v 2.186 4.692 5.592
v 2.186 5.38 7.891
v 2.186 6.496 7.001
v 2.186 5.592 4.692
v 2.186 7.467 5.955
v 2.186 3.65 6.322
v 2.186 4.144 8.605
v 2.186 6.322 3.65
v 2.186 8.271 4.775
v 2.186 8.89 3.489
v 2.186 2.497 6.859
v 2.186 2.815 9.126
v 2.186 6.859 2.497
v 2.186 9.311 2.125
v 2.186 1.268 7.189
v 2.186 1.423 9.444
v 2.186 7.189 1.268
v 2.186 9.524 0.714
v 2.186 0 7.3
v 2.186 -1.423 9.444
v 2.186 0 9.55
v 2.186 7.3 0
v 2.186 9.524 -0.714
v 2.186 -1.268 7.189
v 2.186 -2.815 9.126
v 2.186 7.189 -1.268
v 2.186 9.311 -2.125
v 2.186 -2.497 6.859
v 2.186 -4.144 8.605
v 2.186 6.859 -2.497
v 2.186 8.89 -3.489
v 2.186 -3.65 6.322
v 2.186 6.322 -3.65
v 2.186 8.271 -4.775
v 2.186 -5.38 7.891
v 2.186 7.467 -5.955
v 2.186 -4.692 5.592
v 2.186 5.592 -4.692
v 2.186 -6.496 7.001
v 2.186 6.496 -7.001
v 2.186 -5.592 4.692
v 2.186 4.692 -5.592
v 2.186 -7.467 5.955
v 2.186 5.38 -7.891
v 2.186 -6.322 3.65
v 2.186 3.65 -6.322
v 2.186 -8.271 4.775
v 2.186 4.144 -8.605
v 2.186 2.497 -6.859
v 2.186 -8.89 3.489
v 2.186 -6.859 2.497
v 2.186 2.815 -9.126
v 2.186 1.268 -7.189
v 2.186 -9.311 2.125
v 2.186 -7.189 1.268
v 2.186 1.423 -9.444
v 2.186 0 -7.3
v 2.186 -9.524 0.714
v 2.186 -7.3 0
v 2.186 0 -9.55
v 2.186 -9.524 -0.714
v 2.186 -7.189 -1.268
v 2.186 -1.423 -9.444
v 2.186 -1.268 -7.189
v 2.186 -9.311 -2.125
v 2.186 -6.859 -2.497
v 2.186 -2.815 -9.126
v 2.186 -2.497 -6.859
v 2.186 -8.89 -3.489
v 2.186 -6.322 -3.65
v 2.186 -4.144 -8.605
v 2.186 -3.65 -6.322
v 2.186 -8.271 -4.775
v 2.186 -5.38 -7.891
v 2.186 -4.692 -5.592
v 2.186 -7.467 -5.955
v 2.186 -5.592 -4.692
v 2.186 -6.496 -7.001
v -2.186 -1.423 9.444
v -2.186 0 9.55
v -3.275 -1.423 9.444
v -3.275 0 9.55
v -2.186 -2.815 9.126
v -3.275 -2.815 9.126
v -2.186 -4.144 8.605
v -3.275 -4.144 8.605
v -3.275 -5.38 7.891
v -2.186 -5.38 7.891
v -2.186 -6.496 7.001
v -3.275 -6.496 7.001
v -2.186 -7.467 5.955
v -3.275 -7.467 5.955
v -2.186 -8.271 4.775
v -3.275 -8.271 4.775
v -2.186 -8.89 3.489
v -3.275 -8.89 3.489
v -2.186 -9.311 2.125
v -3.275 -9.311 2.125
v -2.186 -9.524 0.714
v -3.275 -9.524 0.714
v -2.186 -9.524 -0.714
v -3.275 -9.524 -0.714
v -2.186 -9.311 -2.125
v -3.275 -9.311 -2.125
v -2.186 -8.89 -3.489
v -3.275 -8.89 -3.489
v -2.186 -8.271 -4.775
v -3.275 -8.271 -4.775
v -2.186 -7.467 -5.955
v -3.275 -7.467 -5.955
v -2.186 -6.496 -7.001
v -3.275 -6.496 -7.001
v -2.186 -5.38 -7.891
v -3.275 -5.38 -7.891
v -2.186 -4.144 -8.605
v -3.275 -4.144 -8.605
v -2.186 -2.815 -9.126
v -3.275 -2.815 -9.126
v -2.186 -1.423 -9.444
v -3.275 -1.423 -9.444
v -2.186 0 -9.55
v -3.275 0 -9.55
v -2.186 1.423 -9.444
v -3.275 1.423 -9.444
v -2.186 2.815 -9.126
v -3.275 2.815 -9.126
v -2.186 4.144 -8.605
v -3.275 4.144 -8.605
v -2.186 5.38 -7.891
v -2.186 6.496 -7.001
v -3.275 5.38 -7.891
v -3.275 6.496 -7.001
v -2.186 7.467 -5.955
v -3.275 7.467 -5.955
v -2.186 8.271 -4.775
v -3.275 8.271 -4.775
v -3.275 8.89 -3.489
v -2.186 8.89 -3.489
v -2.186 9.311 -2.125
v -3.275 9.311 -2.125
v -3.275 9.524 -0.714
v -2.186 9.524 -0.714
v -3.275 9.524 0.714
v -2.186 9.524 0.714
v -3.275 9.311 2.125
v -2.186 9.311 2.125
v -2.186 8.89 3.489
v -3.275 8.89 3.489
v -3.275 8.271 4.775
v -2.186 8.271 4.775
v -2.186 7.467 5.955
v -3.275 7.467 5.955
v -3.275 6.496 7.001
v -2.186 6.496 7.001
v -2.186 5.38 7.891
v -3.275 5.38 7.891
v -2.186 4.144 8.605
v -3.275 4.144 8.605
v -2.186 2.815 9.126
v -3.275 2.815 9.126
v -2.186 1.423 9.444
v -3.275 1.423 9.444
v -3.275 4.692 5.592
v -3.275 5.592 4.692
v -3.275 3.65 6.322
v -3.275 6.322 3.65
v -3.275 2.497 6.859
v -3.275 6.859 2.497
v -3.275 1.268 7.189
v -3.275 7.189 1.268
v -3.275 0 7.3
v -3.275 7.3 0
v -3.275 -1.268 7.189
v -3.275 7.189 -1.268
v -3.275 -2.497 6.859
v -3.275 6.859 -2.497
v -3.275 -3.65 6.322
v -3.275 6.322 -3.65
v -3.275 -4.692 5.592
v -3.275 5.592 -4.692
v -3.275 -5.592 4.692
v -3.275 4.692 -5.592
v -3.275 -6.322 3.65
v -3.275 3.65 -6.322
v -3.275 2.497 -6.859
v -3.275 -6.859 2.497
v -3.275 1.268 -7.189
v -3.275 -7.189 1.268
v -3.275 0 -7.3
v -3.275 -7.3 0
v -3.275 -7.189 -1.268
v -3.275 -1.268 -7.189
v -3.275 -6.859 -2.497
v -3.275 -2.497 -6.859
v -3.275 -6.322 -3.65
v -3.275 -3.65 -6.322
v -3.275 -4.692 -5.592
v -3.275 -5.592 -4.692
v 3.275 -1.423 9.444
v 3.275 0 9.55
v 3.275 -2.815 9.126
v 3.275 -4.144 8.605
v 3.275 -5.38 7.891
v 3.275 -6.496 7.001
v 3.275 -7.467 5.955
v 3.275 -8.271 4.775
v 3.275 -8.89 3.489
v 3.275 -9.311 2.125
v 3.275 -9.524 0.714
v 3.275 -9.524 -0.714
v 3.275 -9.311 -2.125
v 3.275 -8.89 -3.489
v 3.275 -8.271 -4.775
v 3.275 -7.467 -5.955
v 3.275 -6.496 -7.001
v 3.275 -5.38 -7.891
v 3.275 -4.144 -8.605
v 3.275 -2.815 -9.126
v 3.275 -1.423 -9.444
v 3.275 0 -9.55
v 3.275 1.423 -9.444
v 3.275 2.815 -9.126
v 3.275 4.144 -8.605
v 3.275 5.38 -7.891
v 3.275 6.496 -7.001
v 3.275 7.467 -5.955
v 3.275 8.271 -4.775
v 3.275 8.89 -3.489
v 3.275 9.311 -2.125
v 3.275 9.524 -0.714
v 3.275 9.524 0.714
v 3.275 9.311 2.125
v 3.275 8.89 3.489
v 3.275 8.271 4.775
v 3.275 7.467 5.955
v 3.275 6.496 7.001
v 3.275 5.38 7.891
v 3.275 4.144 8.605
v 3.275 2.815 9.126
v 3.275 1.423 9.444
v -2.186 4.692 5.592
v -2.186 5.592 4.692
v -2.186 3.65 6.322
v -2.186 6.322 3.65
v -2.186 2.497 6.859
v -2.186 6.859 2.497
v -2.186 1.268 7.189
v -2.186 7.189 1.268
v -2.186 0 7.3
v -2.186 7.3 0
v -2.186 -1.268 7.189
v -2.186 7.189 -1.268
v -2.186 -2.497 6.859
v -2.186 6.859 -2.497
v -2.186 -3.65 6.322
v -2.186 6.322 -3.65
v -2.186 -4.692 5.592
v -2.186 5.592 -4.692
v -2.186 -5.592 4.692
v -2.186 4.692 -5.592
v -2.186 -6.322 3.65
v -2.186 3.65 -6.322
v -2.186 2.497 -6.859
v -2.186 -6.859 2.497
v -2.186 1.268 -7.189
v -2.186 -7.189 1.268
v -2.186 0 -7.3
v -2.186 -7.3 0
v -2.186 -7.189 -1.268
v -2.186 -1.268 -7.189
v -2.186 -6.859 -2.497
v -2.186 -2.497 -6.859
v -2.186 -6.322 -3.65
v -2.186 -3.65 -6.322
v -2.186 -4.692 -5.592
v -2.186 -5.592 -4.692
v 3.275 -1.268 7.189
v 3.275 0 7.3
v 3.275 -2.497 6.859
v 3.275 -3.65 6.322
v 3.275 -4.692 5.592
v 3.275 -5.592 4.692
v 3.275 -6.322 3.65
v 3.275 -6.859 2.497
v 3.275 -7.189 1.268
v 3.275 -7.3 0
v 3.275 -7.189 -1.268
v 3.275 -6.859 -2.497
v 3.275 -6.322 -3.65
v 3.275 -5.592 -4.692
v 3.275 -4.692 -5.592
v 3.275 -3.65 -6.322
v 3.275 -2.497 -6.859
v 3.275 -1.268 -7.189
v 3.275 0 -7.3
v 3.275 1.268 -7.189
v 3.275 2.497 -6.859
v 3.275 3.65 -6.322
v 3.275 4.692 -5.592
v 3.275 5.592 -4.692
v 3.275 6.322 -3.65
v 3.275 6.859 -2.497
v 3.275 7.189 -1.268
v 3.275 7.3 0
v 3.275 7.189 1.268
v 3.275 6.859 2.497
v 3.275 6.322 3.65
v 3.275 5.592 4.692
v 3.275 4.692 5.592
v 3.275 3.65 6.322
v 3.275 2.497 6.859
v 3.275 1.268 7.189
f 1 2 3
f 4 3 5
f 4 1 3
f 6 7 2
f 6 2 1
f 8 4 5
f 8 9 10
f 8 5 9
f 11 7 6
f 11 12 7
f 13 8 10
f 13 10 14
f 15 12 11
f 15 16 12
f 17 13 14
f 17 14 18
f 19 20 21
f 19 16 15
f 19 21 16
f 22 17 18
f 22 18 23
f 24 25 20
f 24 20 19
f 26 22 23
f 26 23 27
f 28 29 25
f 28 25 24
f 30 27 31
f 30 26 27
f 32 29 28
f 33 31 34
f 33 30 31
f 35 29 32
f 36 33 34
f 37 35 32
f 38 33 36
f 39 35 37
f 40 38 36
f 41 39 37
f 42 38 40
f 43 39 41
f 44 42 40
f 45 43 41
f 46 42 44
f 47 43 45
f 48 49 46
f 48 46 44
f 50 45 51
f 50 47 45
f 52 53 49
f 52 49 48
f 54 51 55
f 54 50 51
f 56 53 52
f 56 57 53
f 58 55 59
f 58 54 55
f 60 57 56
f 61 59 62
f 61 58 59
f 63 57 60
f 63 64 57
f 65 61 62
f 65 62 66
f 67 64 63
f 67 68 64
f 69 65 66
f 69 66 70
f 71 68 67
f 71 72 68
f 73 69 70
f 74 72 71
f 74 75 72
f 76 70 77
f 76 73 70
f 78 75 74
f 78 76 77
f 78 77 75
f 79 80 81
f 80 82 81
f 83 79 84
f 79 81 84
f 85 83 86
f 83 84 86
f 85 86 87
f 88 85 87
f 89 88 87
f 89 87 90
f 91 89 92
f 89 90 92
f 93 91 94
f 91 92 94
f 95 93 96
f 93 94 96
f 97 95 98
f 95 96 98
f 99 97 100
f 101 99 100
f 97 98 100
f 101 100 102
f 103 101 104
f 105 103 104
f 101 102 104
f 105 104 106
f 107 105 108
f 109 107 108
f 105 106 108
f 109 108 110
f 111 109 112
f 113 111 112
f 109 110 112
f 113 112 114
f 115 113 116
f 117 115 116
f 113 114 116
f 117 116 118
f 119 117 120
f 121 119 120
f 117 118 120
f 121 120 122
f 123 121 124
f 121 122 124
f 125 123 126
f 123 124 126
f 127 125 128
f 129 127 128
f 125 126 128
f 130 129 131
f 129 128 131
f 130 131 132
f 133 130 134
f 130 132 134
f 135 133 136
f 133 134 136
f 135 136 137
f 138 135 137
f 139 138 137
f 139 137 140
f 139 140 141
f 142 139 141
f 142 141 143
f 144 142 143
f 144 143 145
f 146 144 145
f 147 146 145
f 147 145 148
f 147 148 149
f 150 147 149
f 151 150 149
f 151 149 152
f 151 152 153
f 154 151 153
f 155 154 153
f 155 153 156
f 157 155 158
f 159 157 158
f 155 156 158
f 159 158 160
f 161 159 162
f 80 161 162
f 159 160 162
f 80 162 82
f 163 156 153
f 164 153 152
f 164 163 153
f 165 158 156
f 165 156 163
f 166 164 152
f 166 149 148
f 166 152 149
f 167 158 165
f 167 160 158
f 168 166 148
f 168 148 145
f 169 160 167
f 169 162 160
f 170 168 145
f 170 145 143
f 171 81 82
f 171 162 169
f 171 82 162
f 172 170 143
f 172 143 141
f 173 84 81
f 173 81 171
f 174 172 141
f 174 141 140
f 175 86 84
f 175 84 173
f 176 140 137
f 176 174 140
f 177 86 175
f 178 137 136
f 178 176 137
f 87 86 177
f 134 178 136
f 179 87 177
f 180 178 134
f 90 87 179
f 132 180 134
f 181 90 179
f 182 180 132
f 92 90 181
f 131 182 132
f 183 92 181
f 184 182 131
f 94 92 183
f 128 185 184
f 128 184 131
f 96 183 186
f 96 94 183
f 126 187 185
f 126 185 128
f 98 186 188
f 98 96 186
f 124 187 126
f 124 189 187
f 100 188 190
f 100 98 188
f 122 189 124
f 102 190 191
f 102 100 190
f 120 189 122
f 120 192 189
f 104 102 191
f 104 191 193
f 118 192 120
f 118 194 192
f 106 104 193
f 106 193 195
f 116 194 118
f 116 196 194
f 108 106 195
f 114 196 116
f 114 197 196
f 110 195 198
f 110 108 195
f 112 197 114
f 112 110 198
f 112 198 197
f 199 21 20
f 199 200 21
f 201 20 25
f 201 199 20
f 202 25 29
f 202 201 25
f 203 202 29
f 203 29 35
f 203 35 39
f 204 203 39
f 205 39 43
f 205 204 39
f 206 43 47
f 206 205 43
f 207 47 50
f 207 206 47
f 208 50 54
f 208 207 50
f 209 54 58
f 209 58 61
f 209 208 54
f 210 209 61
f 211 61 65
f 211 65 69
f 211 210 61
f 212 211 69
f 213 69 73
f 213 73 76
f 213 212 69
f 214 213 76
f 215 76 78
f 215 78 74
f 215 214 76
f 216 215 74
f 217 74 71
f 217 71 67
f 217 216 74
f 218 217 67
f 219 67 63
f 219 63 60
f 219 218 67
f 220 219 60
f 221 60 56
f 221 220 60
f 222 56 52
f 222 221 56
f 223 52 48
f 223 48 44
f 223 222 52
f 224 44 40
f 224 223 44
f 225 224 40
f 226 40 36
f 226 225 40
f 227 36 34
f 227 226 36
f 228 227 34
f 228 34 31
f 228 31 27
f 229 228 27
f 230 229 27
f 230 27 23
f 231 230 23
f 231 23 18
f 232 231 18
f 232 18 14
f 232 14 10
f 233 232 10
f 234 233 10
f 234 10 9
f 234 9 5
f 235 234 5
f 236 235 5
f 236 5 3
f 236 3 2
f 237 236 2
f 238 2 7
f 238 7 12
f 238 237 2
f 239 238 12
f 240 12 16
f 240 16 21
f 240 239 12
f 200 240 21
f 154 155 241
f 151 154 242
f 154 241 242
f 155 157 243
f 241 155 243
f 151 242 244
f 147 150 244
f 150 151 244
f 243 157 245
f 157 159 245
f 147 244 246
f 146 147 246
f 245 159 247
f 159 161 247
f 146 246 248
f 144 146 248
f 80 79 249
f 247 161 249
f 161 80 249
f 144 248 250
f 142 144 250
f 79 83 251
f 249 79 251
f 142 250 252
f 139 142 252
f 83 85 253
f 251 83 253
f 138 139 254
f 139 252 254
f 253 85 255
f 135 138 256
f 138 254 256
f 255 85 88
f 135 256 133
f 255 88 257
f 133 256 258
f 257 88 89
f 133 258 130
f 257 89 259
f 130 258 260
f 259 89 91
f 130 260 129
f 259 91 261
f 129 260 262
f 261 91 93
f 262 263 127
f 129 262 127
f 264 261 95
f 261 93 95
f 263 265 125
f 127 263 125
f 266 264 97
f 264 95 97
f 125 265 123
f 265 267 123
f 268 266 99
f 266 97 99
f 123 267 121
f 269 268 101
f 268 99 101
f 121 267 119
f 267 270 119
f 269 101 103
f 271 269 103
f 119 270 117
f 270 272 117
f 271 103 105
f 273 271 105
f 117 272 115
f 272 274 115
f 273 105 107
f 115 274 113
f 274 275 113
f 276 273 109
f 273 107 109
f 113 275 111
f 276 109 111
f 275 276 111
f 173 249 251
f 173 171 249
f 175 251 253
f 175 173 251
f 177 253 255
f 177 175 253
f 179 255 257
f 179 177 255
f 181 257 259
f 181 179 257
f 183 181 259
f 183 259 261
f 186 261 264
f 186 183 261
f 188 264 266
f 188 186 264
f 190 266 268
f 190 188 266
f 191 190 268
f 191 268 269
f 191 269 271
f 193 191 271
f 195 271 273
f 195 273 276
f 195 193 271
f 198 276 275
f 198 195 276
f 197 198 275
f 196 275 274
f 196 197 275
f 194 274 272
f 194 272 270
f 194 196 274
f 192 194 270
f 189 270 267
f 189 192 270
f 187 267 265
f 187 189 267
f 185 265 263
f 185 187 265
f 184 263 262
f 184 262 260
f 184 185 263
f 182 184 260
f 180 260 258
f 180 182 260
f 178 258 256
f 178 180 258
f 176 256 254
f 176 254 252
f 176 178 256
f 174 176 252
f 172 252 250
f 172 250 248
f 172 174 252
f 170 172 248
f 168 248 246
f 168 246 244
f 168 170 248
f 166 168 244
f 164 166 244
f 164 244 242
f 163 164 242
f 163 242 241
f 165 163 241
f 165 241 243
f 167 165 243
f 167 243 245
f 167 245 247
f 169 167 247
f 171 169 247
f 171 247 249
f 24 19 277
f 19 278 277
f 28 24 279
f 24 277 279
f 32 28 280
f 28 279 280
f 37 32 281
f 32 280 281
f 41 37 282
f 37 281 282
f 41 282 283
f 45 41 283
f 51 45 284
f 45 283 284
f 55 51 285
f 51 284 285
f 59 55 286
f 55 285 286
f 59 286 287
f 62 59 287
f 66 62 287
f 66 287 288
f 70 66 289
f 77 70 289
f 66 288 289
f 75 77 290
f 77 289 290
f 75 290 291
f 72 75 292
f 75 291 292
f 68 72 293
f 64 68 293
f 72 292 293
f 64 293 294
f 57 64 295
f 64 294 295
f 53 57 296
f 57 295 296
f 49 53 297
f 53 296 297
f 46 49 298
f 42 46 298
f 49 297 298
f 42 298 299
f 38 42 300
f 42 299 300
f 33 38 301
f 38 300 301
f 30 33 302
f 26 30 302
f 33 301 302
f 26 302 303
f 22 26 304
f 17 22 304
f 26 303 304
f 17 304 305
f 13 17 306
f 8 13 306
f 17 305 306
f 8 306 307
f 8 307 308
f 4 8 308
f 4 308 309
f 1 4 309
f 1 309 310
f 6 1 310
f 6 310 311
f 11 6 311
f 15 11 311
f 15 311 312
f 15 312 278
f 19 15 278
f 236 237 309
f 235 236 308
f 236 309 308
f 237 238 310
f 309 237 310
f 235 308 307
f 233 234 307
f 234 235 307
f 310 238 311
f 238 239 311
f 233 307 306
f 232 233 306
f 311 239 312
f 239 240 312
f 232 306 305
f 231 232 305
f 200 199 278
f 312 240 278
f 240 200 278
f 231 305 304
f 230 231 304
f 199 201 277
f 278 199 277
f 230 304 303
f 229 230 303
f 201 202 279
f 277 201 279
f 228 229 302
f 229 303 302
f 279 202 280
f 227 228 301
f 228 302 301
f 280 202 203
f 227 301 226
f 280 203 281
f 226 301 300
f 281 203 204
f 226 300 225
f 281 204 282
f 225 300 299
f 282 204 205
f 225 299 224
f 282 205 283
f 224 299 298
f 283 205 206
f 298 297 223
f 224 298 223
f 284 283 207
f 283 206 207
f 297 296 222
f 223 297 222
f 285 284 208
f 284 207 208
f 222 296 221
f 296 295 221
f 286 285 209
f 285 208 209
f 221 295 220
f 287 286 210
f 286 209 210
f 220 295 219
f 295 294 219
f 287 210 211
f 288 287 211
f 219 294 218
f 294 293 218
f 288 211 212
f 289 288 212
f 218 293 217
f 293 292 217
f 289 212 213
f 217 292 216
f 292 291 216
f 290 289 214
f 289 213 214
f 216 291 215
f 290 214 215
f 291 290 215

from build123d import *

# Parameters (mm, degrees)
F0_W = 1.088942
F0_H = 2.250794


with BuildPart() as f1:
    # F0 (on Front) → F1 (revolve)
    with BuildSketch(Plane.XZ):
        with Locations((2.730966, 8.425026)):
            Rectangle(F0_W, F0_H)
    revolve(axis=Axis((5.413548, 0, 0), (1, 0, 0)))


with BuildPart() as f2_1:
    # F2: instance of F1
    add(f1.part.mirror(Plane.YZ))


solid = Compound([f1.part, f2_1.part])
